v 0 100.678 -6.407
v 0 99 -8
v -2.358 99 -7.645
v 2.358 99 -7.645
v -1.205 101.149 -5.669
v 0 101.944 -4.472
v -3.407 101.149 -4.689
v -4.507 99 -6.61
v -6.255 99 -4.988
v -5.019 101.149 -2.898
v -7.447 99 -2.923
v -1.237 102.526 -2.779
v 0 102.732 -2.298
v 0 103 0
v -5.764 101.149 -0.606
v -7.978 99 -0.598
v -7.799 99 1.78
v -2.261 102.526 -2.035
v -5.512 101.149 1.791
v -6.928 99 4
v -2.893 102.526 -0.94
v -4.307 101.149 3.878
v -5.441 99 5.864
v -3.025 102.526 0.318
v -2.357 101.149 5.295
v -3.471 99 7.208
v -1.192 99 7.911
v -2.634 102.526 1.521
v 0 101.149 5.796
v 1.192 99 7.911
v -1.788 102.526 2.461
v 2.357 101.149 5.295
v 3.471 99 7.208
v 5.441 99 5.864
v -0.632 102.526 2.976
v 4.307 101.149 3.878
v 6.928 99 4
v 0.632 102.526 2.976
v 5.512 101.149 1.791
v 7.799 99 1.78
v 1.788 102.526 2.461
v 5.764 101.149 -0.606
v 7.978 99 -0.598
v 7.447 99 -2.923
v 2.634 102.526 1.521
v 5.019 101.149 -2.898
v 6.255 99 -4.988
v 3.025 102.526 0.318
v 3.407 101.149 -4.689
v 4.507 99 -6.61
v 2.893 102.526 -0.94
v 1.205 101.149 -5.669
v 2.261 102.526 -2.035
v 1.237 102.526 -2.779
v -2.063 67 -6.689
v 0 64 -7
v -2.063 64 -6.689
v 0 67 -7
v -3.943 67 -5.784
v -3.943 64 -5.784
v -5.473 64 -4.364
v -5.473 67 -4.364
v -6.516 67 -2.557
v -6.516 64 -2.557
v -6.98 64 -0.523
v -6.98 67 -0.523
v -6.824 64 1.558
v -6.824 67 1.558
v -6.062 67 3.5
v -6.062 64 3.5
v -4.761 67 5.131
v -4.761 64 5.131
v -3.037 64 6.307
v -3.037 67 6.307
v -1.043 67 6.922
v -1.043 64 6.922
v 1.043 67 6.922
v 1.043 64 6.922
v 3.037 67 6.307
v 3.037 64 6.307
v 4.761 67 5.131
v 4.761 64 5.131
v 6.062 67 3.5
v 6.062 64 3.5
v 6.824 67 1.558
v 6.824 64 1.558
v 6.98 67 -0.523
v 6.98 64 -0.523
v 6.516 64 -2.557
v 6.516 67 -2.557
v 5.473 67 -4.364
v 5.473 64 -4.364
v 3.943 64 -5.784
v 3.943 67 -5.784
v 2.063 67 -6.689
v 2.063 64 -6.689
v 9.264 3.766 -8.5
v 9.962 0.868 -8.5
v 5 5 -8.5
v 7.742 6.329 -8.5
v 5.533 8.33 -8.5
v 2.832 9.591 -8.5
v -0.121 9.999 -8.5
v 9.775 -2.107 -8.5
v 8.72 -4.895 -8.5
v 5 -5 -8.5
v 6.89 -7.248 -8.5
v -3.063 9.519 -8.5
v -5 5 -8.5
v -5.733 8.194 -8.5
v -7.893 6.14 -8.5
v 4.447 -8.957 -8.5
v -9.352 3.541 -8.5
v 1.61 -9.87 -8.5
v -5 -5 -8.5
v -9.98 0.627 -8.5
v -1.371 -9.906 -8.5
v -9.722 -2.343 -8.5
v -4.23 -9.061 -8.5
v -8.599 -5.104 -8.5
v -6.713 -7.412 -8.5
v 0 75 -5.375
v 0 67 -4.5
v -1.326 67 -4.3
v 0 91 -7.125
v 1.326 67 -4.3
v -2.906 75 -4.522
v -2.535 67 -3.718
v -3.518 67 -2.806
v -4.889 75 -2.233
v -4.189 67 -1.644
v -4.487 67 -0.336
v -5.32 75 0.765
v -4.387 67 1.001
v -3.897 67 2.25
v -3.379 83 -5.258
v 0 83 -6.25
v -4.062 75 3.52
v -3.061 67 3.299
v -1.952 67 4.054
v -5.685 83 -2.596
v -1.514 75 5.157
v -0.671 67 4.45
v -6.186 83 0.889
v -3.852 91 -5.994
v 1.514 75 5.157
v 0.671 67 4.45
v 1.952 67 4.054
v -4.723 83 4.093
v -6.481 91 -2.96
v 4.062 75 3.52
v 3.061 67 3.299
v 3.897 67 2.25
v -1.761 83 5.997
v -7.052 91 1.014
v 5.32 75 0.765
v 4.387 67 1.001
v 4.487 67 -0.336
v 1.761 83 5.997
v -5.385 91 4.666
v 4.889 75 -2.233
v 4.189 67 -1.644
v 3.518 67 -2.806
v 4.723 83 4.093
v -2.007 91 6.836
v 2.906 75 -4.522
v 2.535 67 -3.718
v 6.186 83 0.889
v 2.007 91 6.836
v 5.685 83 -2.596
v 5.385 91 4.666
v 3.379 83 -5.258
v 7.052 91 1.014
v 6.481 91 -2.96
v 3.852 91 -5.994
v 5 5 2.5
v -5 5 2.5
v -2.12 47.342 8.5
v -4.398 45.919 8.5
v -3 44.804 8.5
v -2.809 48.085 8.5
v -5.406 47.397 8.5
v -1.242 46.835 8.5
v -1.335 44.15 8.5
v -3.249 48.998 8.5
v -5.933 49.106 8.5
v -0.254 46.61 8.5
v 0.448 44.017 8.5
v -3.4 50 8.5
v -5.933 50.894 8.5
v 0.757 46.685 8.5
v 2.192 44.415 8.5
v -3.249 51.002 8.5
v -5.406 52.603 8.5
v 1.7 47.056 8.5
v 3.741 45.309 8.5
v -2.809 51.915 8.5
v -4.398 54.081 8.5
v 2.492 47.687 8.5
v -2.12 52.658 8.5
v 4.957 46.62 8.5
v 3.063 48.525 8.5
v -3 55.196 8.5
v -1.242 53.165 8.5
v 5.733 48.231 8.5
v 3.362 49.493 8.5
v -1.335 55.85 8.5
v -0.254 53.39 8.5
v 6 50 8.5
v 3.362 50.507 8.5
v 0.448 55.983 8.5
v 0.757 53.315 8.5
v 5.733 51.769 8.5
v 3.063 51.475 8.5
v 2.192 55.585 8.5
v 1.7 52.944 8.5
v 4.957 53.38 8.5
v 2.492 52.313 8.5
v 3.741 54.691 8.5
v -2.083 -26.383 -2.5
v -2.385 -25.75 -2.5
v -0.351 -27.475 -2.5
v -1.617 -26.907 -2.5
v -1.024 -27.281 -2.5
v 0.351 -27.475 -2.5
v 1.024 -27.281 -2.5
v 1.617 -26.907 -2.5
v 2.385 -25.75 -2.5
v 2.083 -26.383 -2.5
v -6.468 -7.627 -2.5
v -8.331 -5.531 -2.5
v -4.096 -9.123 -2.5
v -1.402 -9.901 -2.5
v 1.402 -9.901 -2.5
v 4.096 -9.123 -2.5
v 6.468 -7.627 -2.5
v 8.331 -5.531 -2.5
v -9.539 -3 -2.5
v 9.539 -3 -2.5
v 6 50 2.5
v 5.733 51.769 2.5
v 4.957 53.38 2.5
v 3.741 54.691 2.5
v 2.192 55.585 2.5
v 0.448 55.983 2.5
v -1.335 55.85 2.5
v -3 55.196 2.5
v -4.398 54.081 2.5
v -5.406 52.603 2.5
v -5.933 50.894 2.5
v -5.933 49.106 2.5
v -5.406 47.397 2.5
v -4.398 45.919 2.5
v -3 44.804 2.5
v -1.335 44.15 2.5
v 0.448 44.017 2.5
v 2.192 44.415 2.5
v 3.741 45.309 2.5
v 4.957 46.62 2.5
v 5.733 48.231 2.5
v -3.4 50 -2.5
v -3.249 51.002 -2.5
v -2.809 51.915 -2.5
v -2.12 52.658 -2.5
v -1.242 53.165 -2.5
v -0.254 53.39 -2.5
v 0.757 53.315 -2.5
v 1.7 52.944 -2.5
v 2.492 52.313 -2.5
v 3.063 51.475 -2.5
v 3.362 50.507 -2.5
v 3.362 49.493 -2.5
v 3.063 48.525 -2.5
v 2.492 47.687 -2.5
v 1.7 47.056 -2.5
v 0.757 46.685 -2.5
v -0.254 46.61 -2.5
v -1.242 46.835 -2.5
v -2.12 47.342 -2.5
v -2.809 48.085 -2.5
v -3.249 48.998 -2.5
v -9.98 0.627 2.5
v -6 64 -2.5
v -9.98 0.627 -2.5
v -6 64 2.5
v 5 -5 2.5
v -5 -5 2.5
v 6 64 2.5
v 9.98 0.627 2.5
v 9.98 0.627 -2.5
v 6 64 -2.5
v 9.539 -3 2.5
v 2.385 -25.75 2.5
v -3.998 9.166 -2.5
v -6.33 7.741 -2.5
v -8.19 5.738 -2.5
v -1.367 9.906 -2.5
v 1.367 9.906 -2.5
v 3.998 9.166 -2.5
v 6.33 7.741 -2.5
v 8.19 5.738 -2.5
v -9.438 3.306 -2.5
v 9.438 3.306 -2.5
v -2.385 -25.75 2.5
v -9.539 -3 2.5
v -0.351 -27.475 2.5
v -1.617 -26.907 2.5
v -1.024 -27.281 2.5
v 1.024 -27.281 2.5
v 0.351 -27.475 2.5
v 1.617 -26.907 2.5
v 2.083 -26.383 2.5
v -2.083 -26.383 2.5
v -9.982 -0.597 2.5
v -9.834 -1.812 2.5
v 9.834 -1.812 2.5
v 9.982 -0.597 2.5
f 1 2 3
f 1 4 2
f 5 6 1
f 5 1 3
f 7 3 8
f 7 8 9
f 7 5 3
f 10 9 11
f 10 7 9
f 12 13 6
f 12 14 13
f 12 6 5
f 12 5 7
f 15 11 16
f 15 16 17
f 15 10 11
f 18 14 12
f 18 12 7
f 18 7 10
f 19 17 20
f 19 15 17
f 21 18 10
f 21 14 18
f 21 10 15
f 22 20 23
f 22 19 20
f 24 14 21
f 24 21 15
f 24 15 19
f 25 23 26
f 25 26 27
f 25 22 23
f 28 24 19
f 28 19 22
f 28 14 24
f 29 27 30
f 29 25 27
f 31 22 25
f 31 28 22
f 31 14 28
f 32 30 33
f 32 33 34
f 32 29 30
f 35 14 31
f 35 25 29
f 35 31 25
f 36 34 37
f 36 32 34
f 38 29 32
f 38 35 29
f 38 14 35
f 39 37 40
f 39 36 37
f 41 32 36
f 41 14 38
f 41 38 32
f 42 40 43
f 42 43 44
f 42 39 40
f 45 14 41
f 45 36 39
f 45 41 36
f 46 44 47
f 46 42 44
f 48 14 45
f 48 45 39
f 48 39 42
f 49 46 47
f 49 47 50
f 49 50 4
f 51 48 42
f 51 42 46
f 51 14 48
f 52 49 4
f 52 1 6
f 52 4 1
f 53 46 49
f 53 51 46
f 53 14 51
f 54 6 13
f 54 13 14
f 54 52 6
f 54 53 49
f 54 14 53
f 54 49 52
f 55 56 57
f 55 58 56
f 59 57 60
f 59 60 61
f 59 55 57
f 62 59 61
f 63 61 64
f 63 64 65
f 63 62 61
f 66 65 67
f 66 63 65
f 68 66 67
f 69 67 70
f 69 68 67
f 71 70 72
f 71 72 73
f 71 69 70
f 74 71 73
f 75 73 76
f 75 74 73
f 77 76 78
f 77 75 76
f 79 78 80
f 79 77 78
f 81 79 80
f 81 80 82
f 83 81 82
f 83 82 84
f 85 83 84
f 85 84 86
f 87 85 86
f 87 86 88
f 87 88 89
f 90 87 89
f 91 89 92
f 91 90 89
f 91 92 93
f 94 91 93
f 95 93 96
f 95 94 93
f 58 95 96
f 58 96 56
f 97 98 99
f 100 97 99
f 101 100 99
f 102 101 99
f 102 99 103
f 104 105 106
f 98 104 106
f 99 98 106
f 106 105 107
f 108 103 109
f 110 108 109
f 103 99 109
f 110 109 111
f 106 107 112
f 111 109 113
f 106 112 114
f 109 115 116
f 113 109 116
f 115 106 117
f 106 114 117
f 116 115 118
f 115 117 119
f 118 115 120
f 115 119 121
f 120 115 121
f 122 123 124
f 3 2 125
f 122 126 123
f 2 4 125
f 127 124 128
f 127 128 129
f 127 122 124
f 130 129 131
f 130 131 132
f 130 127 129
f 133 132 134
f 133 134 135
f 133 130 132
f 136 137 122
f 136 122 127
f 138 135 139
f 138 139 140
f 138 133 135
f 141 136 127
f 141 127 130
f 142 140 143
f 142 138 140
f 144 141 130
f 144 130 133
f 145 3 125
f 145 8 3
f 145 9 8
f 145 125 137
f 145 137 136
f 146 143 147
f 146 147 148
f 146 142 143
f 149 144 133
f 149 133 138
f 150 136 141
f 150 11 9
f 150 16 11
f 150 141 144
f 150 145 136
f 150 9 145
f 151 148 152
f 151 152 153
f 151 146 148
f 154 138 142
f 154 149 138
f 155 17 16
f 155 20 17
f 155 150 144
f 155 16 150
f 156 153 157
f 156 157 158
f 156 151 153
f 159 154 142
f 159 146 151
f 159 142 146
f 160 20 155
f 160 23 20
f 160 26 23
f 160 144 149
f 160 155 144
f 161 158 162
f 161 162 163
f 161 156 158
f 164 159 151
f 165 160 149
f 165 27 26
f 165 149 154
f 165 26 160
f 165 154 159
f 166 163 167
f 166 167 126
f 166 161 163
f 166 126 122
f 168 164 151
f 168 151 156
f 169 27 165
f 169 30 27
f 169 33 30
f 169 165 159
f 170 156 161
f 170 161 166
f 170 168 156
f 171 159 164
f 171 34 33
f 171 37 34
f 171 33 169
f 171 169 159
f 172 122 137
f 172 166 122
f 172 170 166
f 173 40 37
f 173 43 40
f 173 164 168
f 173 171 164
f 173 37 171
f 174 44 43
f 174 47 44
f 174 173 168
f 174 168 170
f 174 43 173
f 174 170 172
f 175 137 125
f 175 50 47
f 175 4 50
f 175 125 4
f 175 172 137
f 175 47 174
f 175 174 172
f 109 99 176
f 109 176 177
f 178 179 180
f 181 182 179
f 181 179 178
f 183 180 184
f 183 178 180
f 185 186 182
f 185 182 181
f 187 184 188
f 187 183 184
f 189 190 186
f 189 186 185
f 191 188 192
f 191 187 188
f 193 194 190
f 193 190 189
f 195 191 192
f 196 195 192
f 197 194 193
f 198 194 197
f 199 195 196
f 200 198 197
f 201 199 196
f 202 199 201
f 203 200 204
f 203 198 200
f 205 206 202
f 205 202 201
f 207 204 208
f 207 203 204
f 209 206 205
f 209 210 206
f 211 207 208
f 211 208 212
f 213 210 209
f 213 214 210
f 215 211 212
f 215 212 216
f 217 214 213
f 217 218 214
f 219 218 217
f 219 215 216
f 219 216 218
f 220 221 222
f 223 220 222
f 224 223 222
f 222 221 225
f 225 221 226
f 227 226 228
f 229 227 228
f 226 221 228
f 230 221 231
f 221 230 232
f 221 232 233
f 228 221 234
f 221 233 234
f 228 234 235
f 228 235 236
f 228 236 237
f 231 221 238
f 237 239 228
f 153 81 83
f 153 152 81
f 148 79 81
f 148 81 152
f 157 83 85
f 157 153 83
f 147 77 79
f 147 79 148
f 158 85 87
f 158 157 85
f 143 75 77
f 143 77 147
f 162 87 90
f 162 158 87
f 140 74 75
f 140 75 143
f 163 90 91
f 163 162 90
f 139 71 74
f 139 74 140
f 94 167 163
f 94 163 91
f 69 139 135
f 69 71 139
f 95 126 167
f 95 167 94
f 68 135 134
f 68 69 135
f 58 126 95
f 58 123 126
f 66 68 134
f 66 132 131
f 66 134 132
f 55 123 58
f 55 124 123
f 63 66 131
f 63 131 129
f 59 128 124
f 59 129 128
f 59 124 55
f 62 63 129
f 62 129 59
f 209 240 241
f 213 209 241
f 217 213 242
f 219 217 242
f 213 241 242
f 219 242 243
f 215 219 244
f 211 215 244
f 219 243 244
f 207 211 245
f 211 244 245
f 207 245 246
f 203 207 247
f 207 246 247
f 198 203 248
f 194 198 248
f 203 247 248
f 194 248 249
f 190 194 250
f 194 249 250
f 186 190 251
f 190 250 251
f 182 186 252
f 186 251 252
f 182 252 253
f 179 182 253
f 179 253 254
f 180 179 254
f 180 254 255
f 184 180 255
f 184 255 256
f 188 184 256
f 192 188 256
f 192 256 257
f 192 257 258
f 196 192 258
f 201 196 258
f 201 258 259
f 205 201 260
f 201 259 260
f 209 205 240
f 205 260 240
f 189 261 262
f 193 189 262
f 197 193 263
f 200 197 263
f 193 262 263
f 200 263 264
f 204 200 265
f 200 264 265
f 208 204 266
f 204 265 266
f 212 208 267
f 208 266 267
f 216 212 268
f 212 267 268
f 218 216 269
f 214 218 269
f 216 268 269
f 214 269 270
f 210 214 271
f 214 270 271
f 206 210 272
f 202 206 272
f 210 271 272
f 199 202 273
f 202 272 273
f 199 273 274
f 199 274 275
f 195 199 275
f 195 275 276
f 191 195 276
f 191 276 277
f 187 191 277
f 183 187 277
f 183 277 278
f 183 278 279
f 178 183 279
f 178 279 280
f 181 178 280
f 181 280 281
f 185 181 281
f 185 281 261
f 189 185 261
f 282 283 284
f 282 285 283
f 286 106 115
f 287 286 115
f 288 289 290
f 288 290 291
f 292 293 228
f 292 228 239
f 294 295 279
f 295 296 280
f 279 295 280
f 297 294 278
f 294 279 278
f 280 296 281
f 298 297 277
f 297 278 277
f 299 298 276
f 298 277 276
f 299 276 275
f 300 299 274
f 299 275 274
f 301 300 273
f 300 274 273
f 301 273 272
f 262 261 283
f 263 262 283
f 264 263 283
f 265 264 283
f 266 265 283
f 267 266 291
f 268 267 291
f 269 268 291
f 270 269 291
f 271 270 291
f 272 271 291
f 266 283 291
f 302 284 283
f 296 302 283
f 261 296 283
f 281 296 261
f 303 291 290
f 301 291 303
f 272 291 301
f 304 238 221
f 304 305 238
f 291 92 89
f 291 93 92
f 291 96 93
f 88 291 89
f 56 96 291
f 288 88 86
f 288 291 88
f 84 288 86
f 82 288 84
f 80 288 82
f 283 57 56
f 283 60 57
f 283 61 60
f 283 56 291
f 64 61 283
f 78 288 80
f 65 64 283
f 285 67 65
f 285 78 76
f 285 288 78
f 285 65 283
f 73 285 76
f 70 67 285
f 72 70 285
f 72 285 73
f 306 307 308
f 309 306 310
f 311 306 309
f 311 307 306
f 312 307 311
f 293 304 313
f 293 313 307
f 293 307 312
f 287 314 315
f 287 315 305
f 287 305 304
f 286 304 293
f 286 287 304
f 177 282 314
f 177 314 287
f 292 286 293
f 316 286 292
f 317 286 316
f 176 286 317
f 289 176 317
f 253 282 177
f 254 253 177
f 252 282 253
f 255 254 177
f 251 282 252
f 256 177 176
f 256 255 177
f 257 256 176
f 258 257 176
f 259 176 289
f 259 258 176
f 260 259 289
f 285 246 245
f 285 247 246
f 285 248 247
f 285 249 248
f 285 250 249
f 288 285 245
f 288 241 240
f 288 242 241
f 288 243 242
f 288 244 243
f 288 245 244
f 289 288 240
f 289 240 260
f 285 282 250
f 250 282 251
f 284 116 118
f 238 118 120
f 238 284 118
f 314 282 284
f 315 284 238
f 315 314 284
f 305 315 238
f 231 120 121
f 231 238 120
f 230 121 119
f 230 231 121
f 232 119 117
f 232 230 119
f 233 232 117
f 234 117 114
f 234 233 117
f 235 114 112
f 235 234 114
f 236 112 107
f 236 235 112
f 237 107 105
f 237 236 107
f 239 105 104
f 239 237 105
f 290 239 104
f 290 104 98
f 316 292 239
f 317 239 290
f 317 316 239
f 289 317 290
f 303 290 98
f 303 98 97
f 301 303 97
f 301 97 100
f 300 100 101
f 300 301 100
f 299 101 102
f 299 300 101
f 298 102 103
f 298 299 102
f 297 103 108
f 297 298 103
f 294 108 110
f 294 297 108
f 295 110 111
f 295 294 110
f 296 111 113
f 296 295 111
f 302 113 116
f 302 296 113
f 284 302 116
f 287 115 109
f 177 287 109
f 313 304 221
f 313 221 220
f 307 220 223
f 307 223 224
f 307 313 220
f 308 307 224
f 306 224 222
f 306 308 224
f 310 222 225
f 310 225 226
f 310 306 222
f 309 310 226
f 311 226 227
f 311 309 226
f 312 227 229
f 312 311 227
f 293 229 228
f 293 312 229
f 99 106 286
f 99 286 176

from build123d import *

# Parameters (mm, degrees)
BOSS_EXTRUDE1_DEPTH = 2.5
SKETCH3_R           = 10
BOSS_EXTRUDE2_DEPTH = 11
SKETCH4_R           = 6
BOSS_EXTRUDE3_DEPTH = 6
M8_TAPPED_HOLE1_D   = 6.8
SKETCH7_W           = 10
SKETCH7_H           = 10
CUT_EXTRUDE1_DEPTH  = 67.970142601


with BuildPart() as part:
    # Sketch2 → Boss-Extrude1 (new, symmetric)
    with BuildSketch(Plane.XY):
        with BuildLine():
            Line((-9.539392014, -3), (-2.384848004, -25.75))
            ThreePointArc((-2.384848004, -25.75), (0, -27.5), (2.384848004, -25.75))
            Line((2.384848004, -25.75), (9.539392014, -3))
            ThreePointArc((9.539392014, -3), (9.92690409, -1.206886566), (9.980334012, 0.626843686))
            Line((9.980334012, 0.626843686), (6, 64))
            Line((6, 64), (-6, 64))
            Line((-6, 64), (-9.980334012, 0.626843686))
            ThreePointArc((-9.980334012, 0.626843686), (-9.92690409, -1.206886566), (-9.539392014, -3))
        make_face()
    extrude(amount=BOSS_EXTRUDE1_DEPTH, both=True)

    # Sketch3 → Boss-Extrude2 (add)
    with BuildSketch(Plane.XY.offset(2.5)):
        with Locations(Location((0, 0, 0), (0, 0, 176.406094003))):
            Circle(SKETCH3_R)
    extrude(amount=-BOSS_EXTRUDE2_DEPTH)

    # Sketch4 → Boss-Extrude3 (add)
    with BuildSketch(Plane.XY.offset(2.5)):
        with Locations((0, 50)):
            Circle(SKETCH4_R)
    extrude(amount=BOSS_EXTRUDE3_DEPTH)

    # M8 Tapped Hole1 (through all)
    with Locations(Plane.XY.offset(8.5)):
        with Locations((0, 50)):
            Hole(M8_TAPPED_HOLE1_D / 2)

    # Sketch7 → Cut-Extrude1 (cut, through all)
    with BuildSketch(Plane(origin=(0, 0, -8.5), x_dir=(-1, 0, 0), z_dir=(0, 0, -1))):
        Rectangle(SKETCH7_W, SKETCH7_H)
    extrude(amount=-CUT_EXTRUDE1_DEPTH, mode=Mode.SUBTRACT)

    # Sketch8 → Revolve1 (revolve)
    with BuildSketch(Plane.XY, mode=Mode.PRIVATE) as revolve1_sk:
        with BuildLine():
            Line((0, 64), (-7, 64))
            Line((-7, 64), (-7, 67))
            Line((-7, 67), (-4.5, 67))
            Line((-4.5, 67), (-8, 99))
            ThreePointArc((-8, 99), (-4.472135955, 101.94427191), (0, 103))
            Line((0, 103), (0, 64))
        make_face()
    revolve(revolve1_sk.sketch.rotate(Axis((0, 0, 0), (0, 1, 0)), 270), axis=Axis((0, 0, 0), (0, 1, 0)))


solid = part.part
